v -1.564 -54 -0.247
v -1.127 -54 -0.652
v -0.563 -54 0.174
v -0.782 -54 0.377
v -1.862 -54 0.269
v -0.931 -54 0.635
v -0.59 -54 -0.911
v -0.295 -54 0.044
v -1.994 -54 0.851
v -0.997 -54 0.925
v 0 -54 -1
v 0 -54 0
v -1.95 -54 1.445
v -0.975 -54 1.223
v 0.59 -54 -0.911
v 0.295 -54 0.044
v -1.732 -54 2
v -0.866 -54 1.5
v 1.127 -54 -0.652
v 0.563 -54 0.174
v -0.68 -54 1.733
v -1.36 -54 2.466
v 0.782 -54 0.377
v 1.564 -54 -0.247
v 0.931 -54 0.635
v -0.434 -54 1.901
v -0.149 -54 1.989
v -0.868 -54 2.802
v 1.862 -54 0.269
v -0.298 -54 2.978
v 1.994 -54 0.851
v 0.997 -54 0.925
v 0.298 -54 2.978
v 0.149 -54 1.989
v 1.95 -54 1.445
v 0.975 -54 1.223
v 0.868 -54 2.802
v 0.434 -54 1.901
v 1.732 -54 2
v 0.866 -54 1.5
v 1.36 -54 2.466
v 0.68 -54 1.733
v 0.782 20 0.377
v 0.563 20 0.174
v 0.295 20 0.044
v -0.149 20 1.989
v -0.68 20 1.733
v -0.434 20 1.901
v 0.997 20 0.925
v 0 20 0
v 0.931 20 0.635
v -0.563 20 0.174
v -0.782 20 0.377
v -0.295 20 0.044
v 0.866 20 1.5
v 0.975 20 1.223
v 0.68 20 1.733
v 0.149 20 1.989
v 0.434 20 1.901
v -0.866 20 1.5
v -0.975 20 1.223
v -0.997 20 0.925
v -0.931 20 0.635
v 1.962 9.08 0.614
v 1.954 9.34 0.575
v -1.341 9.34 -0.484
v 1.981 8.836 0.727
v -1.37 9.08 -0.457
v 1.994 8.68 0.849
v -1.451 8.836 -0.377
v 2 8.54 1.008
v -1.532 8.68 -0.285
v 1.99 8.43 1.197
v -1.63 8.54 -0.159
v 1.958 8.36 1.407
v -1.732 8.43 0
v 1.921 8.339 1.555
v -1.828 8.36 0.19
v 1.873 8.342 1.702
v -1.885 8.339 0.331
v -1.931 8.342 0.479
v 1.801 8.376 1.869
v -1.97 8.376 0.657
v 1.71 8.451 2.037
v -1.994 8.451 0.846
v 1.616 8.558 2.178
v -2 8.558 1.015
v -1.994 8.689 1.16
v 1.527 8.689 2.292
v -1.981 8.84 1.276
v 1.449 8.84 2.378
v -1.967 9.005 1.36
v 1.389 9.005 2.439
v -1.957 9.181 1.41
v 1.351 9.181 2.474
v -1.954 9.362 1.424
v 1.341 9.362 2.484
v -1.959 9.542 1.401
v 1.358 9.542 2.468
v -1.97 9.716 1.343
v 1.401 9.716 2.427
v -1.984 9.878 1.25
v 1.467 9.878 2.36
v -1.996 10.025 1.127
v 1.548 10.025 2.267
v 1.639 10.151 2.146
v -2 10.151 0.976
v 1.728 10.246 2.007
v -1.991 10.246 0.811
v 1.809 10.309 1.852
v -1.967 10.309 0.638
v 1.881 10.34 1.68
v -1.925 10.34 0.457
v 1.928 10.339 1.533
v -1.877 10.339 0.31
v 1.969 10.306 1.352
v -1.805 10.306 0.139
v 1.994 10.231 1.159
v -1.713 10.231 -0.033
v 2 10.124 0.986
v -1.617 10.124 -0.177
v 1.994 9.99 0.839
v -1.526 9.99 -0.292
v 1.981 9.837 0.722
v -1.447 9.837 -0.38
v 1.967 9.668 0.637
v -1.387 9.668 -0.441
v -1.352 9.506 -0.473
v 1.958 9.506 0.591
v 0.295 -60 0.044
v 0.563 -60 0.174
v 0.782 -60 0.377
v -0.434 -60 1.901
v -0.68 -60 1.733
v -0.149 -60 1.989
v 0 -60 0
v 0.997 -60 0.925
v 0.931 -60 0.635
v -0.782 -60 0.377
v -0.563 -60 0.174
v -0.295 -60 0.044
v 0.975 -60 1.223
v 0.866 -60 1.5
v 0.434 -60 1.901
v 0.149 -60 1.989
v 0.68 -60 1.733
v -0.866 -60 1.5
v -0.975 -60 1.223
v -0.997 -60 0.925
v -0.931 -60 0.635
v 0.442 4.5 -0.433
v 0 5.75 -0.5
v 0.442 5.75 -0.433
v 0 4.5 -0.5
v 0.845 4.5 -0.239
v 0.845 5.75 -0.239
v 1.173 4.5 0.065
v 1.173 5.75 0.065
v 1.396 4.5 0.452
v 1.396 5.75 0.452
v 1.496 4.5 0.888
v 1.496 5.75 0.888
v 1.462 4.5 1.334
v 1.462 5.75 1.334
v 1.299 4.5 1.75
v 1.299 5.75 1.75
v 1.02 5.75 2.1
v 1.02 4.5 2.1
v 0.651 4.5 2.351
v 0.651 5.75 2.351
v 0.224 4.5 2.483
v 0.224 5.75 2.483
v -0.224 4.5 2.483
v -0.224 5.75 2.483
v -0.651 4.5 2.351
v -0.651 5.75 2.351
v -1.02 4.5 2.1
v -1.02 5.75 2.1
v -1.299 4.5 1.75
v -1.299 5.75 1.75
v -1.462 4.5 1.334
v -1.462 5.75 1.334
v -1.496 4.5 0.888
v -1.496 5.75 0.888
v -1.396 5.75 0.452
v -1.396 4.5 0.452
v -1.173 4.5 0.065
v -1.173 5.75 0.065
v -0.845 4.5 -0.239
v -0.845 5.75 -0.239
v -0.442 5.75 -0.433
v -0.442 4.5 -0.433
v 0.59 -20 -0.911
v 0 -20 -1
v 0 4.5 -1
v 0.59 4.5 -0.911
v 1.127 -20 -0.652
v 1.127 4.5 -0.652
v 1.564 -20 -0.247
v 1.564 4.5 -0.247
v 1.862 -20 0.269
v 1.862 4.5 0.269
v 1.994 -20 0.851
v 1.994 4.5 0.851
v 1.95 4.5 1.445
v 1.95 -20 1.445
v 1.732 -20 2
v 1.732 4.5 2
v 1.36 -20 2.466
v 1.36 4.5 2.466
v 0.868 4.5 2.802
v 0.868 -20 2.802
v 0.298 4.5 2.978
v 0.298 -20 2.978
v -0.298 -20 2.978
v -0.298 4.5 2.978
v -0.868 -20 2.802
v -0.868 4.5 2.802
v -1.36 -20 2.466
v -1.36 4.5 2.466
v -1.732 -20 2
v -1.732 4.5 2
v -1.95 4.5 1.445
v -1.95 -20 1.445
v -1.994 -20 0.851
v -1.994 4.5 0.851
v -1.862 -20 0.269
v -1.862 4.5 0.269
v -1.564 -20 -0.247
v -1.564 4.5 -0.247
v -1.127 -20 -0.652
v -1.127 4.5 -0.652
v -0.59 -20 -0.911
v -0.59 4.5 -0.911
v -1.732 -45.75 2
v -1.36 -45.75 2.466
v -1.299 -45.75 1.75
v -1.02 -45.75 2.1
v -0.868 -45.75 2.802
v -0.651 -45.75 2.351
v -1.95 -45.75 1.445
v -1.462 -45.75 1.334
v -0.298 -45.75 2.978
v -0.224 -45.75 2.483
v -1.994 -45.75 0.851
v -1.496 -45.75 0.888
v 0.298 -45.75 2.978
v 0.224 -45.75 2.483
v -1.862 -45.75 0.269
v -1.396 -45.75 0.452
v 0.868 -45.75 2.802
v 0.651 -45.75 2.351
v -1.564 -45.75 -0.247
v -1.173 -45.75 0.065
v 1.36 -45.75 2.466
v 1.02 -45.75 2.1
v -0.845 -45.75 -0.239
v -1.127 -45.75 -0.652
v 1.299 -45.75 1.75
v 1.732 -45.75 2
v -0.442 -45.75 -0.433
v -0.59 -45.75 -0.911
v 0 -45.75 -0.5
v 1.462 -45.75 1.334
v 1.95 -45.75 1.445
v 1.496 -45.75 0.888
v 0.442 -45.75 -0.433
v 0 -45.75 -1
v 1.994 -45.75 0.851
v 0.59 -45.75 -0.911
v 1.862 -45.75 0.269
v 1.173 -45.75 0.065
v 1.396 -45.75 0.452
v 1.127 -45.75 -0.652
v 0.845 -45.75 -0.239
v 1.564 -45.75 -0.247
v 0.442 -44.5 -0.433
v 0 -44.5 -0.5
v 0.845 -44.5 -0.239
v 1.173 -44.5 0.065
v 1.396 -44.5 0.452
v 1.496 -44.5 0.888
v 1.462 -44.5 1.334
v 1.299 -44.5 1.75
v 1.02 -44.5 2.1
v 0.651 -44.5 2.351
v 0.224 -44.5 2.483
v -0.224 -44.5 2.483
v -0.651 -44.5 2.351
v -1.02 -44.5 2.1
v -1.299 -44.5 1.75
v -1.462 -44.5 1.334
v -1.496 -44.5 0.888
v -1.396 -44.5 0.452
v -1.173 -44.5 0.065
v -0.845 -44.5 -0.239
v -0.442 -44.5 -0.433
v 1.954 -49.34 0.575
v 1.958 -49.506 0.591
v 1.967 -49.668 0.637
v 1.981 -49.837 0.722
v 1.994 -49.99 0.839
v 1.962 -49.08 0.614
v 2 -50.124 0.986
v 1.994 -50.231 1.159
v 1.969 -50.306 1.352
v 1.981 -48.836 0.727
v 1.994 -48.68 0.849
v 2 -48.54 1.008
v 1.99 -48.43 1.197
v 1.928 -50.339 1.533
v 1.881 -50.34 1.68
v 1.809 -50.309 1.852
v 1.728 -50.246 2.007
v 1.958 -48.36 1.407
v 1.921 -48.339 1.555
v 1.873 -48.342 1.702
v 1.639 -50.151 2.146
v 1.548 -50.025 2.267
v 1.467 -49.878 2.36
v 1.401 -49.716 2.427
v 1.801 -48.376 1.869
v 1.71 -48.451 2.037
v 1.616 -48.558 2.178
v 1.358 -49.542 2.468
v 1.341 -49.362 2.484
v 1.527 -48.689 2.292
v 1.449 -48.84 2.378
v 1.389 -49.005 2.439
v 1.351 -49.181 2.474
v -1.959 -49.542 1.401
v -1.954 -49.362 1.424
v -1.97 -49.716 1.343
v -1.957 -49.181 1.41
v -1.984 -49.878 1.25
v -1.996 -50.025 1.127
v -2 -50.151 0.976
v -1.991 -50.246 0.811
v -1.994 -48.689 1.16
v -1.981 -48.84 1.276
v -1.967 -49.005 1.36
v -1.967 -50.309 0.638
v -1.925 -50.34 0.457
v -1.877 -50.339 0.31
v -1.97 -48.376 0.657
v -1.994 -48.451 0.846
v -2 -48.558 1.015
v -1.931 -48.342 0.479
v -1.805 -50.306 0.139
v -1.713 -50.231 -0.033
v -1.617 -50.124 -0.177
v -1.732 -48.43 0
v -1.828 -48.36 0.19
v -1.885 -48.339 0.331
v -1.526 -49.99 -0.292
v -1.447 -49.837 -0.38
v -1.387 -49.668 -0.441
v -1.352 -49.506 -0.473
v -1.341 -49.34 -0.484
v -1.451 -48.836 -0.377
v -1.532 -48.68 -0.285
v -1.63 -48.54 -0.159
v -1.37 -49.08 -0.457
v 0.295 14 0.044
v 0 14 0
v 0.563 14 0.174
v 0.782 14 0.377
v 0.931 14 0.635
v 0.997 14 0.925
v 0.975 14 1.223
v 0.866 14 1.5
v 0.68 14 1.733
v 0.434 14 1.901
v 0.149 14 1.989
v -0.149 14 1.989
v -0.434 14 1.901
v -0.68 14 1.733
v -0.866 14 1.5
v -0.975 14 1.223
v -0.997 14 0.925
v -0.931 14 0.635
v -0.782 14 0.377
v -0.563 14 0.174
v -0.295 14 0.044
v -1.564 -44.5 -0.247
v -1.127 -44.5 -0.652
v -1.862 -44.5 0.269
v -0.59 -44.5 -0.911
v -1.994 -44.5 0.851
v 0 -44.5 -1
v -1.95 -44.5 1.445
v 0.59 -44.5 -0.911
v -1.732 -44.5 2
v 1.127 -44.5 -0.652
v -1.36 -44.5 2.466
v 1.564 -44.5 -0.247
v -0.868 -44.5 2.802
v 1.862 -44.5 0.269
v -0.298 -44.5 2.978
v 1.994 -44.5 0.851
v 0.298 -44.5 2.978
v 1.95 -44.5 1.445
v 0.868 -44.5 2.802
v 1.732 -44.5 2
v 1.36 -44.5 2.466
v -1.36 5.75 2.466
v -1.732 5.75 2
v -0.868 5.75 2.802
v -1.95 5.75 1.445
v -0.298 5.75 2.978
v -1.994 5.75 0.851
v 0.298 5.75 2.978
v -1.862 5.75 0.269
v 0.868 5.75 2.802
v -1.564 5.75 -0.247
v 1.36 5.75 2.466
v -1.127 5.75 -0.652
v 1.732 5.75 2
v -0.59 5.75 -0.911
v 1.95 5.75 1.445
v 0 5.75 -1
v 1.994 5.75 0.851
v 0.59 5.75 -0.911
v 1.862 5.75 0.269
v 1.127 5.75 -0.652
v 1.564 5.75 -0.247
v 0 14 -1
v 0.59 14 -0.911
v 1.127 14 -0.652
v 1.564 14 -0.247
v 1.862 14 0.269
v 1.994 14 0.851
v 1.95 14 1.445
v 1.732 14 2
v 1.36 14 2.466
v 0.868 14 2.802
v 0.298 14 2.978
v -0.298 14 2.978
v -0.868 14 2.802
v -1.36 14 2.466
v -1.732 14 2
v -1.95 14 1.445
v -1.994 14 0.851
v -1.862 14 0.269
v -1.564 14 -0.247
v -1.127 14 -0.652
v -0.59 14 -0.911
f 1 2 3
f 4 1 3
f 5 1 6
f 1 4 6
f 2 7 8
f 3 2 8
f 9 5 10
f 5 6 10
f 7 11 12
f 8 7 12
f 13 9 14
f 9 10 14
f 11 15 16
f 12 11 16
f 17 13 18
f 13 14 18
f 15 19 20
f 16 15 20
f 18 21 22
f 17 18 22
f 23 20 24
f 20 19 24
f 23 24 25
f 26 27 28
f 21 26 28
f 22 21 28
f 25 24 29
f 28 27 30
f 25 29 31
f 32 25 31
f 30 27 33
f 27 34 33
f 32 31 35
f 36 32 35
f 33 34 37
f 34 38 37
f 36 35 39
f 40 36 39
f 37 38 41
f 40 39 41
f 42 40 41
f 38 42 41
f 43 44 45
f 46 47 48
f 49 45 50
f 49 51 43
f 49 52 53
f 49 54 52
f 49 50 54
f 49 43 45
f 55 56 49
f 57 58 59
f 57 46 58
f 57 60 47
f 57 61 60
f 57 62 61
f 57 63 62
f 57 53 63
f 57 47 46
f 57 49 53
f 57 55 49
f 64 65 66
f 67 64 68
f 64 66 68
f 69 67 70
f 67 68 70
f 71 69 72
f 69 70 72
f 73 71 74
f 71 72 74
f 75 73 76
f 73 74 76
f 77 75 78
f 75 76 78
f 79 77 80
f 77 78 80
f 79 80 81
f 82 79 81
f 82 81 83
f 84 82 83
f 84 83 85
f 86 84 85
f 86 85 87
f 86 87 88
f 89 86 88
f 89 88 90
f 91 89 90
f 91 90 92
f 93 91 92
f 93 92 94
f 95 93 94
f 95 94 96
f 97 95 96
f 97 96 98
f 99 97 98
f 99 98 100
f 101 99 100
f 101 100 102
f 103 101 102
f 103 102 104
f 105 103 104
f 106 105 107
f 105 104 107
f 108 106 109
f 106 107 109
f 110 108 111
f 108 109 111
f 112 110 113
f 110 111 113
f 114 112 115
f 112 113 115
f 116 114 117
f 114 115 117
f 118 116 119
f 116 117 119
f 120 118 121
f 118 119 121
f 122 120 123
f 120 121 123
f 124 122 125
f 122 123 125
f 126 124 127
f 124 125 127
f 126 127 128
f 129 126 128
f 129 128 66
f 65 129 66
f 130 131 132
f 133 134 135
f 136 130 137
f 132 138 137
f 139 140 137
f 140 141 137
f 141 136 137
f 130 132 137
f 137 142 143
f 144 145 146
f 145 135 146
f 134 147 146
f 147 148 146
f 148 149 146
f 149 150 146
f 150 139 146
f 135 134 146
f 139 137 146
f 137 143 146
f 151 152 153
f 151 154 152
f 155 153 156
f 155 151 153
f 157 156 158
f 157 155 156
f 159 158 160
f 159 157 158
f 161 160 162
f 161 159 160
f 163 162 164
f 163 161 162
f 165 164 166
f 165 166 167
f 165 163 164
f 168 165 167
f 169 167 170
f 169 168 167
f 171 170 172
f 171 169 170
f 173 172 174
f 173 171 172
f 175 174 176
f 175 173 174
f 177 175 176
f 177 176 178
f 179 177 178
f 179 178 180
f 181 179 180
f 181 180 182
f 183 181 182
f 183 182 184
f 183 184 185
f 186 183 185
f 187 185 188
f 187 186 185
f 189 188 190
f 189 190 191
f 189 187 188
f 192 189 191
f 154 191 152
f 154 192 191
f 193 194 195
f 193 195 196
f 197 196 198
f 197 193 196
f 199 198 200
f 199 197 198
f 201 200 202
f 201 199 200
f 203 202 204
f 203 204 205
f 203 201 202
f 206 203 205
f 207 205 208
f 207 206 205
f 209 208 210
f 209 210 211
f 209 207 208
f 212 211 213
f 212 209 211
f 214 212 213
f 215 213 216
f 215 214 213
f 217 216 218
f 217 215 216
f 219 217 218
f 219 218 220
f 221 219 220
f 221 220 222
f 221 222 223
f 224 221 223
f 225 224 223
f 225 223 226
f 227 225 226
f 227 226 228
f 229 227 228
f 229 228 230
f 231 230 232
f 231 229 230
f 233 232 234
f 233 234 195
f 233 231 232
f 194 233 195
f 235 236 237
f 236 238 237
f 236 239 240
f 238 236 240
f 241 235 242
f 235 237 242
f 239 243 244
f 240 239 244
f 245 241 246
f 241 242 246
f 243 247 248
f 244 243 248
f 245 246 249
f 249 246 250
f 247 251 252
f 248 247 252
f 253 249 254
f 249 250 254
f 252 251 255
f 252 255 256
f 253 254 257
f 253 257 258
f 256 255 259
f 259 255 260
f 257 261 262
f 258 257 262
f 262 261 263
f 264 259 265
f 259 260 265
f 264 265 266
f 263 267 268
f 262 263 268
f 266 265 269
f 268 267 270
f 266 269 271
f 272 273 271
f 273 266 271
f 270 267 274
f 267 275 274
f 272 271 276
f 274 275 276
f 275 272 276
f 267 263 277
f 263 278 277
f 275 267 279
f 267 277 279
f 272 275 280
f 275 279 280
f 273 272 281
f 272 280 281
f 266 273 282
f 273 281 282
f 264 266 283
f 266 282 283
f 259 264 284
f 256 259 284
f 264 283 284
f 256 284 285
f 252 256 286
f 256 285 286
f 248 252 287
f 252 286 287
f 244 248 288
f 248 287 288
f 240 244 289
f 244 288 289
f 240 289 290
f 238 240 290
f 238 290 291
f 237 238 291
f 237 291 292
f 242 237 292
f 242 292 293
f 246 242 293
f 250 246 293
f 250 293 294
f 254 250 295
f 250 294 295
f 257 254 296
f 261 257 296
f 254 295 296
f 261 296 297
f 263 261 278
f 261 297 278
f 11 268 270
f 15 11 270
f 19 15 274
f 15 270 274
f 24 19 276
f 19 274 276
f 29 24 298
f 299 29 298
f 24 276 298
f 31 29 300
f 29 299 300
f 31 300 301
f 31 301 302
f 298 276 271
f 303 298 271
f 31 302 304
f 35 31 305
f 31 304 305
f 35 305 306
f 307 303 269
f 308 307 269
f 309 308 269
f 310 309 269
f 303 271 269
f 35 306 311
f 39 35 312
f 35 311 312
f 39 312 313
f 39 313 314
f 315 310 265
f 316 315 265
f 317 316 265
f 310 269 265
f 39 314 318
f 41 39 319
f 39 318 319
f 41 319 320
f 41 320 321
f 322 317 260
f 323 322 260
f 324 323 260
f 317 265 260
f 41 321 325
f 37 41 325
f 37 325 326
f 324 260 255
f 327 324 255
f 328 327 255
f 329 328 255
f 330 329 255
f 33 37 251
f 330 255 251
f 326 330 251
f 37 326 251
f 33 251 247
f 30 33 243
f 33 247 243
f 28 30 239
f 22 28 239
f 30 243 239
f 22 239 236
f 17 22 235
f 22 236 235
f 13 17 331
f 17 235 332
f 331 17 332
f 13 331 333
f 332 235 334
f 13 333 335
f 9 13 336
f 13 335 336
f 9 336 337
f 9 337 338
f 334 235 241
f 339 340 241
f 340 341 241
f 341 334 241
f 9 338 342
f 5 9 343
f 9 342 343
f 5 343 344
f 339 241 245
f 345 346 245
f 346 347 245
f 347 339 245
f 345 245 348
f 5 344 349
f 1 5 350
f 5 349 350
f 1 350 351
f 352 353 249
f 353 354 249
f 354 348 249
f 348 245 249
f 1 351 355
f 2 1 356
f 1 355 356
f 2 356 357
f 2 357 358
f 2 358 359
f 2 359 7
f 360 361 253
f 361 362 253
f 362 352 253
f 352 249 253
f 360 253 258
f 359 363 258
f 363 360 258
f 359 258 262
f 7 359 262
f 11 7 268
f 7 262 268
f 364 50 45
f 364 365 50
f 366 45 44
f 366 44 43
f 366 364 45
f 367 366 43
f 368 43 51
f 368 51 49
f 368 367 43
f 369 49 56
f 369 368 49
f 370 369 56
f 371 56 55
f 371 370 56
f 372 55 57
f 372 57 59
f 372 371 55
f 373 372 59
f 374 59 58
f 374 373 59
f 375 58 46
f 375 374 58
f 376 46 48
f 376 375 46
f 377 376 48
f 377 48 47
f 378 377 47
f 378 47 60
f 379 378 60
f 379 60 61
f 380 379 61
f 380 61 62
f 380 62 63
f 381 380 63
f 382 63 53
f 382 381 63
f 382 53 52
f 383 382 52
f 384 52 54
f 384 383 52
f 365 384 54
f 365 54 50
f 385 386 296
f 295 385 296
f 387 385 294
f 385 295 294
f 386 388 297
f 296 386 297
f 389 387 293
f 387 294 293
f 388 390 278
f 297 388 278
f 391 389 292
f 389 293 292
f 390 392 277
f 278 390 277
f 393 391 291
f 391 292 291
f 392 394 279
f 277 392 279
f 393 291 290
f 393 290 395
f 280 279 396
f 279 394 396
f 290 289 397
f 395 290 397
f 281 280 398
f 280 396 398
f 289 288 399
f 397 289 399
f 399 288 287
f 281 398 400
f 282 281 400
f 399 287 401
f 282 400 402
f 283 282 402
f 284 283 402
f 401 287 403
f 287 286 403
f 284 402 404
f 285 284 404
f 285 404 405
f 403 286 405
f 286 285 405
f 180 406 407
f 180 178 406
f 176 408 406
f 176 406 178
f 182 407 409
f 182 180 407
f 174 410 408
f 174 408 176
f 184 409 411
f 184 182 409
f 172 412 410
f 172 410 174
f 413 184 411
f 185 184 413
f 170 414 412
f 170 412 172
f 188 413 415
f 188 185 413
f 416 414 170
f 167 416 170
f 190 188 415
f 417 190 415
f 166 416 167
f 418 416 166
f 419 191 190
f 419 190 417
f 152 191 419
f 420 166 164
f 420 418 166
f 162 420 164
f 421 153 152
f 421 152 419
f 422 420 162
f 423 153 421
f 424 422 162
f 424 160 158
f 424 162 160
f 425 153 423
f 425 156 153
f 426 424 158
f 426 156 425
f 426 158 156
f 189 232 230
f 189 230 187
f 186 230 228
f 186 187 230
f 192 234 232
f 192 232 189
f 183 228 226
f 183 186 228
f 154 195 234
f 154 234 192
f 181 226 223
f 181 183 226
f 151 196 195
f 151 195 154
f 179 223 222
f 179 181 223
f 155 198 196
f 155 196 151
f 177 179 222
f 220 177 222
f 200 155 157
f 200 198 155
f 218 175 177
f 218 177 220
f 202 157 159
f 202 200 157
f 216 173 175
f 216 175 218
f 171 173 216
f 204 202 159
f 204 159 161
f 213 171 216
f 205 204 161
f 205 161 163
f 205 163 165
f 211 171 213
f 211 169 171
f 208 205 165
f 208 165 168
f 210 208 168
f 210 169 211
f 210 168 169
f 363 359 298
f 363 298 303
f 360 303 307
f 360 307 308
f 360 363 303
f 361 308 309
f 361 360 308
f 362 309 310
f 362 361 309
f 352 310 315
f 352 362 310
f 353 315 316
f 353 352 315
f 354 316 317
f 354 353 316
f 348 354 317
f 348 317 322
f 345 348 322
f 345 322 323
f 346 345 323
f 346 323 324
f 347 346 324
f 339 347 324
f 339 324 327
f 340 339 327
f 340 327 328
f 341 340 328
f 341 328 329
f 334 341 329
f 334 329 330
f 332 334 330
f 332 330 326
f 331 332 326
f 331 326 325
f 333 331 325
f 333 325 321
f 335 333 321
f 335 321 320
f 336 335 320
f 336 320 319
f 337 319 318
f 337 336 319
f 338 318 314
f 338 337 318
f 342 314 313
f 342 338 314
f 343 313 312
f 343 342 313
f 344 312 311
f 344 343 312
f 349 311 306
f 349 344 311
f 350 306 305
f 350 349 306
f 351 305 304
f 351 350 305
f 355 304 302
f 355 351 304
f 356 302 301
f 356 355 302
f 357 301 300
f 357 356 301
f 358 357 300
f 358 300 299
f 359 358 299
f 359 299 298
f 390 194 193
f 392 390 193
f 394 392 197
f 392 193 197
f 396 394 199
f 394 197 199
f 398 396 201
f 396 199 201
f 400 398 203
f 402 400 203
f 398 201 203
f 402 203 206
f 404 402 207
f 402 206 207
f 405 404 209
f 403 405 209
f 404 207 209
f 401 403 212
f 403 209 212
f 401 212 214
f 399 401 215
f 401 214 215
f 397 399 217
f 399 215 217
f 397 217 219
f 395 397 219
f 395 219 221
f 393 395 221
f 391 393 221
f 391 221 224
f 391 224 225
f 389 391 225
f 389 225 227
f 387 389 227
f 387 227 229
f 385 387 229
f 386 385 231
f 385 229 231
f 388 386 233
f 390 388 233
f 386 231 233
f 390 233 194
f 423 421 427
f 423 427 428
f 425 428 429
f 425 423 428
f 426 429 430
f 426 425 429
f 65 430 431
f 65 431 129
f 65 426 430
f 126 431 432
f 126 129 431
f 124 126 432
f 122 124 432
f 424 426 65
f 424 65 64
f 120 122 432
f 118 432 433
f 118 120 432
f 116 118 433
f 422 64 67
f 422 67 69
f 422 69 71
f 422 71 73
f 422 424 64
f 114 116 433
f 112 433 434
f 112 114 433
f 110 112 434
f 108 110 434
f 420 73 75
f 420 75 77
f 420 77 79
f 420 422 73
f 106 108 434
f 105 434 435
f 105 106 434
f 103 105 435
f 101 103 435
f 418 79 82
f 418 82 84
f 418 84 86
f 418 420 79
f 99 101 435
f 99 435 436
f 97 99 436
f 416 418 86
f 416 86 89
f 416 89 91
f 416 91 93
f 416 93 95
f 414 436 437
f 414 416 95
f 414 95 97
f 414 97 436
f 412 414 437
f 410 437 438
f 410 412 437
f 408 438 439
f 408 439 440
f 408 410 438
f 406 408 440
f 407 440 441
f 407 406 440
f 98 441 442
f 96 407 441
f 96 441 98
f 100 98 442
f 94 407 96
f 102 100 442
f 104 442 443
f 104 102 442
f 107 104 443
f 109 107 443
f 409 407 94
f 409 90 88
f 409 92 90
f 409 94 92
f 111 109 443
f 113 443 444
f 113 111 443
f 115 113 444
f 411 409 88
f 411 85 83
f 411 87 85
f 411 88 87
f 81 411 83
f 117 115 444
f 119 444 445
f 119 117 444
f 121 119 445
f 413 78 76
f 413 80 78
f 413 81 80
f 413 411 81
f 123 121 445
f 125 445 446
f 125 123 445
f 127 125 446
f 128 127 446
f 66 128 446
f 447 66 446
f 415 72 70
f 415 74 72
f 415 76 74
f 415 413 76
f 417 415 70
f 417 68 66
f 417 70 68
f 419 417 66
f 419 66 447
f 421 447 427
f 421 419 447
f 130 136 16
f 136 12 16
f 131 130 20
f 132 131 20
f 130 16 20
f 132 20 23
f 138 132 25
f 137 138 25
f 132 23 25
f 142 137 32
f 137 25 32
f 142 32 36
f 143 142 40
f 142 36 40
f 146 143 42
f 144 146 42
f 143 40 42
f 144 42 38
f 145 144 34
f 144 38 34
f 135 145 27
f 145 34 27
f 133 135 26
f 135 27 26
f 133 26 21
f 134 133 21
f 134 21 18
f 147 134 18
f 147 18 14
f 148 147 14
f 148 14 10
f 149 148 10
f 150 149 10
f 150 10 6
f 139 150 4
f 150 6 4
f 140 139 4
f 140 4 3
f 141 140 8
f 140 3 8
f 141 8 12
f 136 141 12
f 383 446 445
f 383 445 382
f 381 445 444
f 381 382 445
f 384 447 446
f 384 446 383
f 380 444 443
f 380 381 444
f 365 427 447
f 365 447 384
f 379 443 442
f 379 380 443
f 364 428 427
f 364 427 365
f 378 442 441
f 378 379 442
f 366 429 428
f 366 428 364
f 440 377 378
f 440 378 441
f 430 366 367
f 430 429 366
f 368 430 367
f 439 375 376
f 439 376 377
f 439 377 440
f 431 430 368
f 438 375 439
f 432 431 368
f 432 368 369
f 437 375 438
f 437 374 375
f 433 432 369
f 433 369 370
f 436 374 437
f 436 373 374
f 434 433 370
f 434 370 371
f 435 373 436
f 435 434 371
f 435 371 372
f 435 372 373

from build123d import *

# Parameters (mm, degrees)
F_2_0MM_PRESS_DOWEL_HOLE1_D = 2.005


with BuildPart() as part:
    # Sketch1 → Revolve1 (revolve)
    with BuildSketch(Plane(origin=(0, 0, 0), x_dir=(0, 0, -1), z_dir=(1, 0, 0))):
        Polygon((-1, 20), (0, 20), (0, 14), (1, 14), (1, 5.75), (0.5, 5.75), (0.5, 4.5), (1, 4.5), (1, -20), (-1, -20), align=None)
    revolve1 = revolve(axis=Axis((0, 20, 1), (0, -1, 0)))

    # Ø2.0mm Press Dowel Hole1 (through all)
    with Locations(Plane(origin=(1.903998662, 9.34, 1.612200209), x_dir=(-0.306100105, 0, 0.951999331), z_dir=(0.951999331, 0, 0.306100105))):
        with Locations((0, 0)):
            f_2_0mm_press_dowel_hole1 = Hole(F_2_0MM_PRESS_DOWEL_HOLE1_D / 2)

    # Mirror1: Revolve1, Ø2.0mm Press Dowel Hole1 across plane
    add(revolve1.mirror(Plane(origin=(0, -20, 1), x_dir=(0, 0, 1), z_dir=(0, 1, 0))))
    add(f_2_0mm_press_dowel_hole1.mirror(Plane(origin=(0, -20, 1), x_dir=(0, 0, 1), z_dir=(0, 1, 0))), mode=Mode.SUBTRACT)


solid = part.part
